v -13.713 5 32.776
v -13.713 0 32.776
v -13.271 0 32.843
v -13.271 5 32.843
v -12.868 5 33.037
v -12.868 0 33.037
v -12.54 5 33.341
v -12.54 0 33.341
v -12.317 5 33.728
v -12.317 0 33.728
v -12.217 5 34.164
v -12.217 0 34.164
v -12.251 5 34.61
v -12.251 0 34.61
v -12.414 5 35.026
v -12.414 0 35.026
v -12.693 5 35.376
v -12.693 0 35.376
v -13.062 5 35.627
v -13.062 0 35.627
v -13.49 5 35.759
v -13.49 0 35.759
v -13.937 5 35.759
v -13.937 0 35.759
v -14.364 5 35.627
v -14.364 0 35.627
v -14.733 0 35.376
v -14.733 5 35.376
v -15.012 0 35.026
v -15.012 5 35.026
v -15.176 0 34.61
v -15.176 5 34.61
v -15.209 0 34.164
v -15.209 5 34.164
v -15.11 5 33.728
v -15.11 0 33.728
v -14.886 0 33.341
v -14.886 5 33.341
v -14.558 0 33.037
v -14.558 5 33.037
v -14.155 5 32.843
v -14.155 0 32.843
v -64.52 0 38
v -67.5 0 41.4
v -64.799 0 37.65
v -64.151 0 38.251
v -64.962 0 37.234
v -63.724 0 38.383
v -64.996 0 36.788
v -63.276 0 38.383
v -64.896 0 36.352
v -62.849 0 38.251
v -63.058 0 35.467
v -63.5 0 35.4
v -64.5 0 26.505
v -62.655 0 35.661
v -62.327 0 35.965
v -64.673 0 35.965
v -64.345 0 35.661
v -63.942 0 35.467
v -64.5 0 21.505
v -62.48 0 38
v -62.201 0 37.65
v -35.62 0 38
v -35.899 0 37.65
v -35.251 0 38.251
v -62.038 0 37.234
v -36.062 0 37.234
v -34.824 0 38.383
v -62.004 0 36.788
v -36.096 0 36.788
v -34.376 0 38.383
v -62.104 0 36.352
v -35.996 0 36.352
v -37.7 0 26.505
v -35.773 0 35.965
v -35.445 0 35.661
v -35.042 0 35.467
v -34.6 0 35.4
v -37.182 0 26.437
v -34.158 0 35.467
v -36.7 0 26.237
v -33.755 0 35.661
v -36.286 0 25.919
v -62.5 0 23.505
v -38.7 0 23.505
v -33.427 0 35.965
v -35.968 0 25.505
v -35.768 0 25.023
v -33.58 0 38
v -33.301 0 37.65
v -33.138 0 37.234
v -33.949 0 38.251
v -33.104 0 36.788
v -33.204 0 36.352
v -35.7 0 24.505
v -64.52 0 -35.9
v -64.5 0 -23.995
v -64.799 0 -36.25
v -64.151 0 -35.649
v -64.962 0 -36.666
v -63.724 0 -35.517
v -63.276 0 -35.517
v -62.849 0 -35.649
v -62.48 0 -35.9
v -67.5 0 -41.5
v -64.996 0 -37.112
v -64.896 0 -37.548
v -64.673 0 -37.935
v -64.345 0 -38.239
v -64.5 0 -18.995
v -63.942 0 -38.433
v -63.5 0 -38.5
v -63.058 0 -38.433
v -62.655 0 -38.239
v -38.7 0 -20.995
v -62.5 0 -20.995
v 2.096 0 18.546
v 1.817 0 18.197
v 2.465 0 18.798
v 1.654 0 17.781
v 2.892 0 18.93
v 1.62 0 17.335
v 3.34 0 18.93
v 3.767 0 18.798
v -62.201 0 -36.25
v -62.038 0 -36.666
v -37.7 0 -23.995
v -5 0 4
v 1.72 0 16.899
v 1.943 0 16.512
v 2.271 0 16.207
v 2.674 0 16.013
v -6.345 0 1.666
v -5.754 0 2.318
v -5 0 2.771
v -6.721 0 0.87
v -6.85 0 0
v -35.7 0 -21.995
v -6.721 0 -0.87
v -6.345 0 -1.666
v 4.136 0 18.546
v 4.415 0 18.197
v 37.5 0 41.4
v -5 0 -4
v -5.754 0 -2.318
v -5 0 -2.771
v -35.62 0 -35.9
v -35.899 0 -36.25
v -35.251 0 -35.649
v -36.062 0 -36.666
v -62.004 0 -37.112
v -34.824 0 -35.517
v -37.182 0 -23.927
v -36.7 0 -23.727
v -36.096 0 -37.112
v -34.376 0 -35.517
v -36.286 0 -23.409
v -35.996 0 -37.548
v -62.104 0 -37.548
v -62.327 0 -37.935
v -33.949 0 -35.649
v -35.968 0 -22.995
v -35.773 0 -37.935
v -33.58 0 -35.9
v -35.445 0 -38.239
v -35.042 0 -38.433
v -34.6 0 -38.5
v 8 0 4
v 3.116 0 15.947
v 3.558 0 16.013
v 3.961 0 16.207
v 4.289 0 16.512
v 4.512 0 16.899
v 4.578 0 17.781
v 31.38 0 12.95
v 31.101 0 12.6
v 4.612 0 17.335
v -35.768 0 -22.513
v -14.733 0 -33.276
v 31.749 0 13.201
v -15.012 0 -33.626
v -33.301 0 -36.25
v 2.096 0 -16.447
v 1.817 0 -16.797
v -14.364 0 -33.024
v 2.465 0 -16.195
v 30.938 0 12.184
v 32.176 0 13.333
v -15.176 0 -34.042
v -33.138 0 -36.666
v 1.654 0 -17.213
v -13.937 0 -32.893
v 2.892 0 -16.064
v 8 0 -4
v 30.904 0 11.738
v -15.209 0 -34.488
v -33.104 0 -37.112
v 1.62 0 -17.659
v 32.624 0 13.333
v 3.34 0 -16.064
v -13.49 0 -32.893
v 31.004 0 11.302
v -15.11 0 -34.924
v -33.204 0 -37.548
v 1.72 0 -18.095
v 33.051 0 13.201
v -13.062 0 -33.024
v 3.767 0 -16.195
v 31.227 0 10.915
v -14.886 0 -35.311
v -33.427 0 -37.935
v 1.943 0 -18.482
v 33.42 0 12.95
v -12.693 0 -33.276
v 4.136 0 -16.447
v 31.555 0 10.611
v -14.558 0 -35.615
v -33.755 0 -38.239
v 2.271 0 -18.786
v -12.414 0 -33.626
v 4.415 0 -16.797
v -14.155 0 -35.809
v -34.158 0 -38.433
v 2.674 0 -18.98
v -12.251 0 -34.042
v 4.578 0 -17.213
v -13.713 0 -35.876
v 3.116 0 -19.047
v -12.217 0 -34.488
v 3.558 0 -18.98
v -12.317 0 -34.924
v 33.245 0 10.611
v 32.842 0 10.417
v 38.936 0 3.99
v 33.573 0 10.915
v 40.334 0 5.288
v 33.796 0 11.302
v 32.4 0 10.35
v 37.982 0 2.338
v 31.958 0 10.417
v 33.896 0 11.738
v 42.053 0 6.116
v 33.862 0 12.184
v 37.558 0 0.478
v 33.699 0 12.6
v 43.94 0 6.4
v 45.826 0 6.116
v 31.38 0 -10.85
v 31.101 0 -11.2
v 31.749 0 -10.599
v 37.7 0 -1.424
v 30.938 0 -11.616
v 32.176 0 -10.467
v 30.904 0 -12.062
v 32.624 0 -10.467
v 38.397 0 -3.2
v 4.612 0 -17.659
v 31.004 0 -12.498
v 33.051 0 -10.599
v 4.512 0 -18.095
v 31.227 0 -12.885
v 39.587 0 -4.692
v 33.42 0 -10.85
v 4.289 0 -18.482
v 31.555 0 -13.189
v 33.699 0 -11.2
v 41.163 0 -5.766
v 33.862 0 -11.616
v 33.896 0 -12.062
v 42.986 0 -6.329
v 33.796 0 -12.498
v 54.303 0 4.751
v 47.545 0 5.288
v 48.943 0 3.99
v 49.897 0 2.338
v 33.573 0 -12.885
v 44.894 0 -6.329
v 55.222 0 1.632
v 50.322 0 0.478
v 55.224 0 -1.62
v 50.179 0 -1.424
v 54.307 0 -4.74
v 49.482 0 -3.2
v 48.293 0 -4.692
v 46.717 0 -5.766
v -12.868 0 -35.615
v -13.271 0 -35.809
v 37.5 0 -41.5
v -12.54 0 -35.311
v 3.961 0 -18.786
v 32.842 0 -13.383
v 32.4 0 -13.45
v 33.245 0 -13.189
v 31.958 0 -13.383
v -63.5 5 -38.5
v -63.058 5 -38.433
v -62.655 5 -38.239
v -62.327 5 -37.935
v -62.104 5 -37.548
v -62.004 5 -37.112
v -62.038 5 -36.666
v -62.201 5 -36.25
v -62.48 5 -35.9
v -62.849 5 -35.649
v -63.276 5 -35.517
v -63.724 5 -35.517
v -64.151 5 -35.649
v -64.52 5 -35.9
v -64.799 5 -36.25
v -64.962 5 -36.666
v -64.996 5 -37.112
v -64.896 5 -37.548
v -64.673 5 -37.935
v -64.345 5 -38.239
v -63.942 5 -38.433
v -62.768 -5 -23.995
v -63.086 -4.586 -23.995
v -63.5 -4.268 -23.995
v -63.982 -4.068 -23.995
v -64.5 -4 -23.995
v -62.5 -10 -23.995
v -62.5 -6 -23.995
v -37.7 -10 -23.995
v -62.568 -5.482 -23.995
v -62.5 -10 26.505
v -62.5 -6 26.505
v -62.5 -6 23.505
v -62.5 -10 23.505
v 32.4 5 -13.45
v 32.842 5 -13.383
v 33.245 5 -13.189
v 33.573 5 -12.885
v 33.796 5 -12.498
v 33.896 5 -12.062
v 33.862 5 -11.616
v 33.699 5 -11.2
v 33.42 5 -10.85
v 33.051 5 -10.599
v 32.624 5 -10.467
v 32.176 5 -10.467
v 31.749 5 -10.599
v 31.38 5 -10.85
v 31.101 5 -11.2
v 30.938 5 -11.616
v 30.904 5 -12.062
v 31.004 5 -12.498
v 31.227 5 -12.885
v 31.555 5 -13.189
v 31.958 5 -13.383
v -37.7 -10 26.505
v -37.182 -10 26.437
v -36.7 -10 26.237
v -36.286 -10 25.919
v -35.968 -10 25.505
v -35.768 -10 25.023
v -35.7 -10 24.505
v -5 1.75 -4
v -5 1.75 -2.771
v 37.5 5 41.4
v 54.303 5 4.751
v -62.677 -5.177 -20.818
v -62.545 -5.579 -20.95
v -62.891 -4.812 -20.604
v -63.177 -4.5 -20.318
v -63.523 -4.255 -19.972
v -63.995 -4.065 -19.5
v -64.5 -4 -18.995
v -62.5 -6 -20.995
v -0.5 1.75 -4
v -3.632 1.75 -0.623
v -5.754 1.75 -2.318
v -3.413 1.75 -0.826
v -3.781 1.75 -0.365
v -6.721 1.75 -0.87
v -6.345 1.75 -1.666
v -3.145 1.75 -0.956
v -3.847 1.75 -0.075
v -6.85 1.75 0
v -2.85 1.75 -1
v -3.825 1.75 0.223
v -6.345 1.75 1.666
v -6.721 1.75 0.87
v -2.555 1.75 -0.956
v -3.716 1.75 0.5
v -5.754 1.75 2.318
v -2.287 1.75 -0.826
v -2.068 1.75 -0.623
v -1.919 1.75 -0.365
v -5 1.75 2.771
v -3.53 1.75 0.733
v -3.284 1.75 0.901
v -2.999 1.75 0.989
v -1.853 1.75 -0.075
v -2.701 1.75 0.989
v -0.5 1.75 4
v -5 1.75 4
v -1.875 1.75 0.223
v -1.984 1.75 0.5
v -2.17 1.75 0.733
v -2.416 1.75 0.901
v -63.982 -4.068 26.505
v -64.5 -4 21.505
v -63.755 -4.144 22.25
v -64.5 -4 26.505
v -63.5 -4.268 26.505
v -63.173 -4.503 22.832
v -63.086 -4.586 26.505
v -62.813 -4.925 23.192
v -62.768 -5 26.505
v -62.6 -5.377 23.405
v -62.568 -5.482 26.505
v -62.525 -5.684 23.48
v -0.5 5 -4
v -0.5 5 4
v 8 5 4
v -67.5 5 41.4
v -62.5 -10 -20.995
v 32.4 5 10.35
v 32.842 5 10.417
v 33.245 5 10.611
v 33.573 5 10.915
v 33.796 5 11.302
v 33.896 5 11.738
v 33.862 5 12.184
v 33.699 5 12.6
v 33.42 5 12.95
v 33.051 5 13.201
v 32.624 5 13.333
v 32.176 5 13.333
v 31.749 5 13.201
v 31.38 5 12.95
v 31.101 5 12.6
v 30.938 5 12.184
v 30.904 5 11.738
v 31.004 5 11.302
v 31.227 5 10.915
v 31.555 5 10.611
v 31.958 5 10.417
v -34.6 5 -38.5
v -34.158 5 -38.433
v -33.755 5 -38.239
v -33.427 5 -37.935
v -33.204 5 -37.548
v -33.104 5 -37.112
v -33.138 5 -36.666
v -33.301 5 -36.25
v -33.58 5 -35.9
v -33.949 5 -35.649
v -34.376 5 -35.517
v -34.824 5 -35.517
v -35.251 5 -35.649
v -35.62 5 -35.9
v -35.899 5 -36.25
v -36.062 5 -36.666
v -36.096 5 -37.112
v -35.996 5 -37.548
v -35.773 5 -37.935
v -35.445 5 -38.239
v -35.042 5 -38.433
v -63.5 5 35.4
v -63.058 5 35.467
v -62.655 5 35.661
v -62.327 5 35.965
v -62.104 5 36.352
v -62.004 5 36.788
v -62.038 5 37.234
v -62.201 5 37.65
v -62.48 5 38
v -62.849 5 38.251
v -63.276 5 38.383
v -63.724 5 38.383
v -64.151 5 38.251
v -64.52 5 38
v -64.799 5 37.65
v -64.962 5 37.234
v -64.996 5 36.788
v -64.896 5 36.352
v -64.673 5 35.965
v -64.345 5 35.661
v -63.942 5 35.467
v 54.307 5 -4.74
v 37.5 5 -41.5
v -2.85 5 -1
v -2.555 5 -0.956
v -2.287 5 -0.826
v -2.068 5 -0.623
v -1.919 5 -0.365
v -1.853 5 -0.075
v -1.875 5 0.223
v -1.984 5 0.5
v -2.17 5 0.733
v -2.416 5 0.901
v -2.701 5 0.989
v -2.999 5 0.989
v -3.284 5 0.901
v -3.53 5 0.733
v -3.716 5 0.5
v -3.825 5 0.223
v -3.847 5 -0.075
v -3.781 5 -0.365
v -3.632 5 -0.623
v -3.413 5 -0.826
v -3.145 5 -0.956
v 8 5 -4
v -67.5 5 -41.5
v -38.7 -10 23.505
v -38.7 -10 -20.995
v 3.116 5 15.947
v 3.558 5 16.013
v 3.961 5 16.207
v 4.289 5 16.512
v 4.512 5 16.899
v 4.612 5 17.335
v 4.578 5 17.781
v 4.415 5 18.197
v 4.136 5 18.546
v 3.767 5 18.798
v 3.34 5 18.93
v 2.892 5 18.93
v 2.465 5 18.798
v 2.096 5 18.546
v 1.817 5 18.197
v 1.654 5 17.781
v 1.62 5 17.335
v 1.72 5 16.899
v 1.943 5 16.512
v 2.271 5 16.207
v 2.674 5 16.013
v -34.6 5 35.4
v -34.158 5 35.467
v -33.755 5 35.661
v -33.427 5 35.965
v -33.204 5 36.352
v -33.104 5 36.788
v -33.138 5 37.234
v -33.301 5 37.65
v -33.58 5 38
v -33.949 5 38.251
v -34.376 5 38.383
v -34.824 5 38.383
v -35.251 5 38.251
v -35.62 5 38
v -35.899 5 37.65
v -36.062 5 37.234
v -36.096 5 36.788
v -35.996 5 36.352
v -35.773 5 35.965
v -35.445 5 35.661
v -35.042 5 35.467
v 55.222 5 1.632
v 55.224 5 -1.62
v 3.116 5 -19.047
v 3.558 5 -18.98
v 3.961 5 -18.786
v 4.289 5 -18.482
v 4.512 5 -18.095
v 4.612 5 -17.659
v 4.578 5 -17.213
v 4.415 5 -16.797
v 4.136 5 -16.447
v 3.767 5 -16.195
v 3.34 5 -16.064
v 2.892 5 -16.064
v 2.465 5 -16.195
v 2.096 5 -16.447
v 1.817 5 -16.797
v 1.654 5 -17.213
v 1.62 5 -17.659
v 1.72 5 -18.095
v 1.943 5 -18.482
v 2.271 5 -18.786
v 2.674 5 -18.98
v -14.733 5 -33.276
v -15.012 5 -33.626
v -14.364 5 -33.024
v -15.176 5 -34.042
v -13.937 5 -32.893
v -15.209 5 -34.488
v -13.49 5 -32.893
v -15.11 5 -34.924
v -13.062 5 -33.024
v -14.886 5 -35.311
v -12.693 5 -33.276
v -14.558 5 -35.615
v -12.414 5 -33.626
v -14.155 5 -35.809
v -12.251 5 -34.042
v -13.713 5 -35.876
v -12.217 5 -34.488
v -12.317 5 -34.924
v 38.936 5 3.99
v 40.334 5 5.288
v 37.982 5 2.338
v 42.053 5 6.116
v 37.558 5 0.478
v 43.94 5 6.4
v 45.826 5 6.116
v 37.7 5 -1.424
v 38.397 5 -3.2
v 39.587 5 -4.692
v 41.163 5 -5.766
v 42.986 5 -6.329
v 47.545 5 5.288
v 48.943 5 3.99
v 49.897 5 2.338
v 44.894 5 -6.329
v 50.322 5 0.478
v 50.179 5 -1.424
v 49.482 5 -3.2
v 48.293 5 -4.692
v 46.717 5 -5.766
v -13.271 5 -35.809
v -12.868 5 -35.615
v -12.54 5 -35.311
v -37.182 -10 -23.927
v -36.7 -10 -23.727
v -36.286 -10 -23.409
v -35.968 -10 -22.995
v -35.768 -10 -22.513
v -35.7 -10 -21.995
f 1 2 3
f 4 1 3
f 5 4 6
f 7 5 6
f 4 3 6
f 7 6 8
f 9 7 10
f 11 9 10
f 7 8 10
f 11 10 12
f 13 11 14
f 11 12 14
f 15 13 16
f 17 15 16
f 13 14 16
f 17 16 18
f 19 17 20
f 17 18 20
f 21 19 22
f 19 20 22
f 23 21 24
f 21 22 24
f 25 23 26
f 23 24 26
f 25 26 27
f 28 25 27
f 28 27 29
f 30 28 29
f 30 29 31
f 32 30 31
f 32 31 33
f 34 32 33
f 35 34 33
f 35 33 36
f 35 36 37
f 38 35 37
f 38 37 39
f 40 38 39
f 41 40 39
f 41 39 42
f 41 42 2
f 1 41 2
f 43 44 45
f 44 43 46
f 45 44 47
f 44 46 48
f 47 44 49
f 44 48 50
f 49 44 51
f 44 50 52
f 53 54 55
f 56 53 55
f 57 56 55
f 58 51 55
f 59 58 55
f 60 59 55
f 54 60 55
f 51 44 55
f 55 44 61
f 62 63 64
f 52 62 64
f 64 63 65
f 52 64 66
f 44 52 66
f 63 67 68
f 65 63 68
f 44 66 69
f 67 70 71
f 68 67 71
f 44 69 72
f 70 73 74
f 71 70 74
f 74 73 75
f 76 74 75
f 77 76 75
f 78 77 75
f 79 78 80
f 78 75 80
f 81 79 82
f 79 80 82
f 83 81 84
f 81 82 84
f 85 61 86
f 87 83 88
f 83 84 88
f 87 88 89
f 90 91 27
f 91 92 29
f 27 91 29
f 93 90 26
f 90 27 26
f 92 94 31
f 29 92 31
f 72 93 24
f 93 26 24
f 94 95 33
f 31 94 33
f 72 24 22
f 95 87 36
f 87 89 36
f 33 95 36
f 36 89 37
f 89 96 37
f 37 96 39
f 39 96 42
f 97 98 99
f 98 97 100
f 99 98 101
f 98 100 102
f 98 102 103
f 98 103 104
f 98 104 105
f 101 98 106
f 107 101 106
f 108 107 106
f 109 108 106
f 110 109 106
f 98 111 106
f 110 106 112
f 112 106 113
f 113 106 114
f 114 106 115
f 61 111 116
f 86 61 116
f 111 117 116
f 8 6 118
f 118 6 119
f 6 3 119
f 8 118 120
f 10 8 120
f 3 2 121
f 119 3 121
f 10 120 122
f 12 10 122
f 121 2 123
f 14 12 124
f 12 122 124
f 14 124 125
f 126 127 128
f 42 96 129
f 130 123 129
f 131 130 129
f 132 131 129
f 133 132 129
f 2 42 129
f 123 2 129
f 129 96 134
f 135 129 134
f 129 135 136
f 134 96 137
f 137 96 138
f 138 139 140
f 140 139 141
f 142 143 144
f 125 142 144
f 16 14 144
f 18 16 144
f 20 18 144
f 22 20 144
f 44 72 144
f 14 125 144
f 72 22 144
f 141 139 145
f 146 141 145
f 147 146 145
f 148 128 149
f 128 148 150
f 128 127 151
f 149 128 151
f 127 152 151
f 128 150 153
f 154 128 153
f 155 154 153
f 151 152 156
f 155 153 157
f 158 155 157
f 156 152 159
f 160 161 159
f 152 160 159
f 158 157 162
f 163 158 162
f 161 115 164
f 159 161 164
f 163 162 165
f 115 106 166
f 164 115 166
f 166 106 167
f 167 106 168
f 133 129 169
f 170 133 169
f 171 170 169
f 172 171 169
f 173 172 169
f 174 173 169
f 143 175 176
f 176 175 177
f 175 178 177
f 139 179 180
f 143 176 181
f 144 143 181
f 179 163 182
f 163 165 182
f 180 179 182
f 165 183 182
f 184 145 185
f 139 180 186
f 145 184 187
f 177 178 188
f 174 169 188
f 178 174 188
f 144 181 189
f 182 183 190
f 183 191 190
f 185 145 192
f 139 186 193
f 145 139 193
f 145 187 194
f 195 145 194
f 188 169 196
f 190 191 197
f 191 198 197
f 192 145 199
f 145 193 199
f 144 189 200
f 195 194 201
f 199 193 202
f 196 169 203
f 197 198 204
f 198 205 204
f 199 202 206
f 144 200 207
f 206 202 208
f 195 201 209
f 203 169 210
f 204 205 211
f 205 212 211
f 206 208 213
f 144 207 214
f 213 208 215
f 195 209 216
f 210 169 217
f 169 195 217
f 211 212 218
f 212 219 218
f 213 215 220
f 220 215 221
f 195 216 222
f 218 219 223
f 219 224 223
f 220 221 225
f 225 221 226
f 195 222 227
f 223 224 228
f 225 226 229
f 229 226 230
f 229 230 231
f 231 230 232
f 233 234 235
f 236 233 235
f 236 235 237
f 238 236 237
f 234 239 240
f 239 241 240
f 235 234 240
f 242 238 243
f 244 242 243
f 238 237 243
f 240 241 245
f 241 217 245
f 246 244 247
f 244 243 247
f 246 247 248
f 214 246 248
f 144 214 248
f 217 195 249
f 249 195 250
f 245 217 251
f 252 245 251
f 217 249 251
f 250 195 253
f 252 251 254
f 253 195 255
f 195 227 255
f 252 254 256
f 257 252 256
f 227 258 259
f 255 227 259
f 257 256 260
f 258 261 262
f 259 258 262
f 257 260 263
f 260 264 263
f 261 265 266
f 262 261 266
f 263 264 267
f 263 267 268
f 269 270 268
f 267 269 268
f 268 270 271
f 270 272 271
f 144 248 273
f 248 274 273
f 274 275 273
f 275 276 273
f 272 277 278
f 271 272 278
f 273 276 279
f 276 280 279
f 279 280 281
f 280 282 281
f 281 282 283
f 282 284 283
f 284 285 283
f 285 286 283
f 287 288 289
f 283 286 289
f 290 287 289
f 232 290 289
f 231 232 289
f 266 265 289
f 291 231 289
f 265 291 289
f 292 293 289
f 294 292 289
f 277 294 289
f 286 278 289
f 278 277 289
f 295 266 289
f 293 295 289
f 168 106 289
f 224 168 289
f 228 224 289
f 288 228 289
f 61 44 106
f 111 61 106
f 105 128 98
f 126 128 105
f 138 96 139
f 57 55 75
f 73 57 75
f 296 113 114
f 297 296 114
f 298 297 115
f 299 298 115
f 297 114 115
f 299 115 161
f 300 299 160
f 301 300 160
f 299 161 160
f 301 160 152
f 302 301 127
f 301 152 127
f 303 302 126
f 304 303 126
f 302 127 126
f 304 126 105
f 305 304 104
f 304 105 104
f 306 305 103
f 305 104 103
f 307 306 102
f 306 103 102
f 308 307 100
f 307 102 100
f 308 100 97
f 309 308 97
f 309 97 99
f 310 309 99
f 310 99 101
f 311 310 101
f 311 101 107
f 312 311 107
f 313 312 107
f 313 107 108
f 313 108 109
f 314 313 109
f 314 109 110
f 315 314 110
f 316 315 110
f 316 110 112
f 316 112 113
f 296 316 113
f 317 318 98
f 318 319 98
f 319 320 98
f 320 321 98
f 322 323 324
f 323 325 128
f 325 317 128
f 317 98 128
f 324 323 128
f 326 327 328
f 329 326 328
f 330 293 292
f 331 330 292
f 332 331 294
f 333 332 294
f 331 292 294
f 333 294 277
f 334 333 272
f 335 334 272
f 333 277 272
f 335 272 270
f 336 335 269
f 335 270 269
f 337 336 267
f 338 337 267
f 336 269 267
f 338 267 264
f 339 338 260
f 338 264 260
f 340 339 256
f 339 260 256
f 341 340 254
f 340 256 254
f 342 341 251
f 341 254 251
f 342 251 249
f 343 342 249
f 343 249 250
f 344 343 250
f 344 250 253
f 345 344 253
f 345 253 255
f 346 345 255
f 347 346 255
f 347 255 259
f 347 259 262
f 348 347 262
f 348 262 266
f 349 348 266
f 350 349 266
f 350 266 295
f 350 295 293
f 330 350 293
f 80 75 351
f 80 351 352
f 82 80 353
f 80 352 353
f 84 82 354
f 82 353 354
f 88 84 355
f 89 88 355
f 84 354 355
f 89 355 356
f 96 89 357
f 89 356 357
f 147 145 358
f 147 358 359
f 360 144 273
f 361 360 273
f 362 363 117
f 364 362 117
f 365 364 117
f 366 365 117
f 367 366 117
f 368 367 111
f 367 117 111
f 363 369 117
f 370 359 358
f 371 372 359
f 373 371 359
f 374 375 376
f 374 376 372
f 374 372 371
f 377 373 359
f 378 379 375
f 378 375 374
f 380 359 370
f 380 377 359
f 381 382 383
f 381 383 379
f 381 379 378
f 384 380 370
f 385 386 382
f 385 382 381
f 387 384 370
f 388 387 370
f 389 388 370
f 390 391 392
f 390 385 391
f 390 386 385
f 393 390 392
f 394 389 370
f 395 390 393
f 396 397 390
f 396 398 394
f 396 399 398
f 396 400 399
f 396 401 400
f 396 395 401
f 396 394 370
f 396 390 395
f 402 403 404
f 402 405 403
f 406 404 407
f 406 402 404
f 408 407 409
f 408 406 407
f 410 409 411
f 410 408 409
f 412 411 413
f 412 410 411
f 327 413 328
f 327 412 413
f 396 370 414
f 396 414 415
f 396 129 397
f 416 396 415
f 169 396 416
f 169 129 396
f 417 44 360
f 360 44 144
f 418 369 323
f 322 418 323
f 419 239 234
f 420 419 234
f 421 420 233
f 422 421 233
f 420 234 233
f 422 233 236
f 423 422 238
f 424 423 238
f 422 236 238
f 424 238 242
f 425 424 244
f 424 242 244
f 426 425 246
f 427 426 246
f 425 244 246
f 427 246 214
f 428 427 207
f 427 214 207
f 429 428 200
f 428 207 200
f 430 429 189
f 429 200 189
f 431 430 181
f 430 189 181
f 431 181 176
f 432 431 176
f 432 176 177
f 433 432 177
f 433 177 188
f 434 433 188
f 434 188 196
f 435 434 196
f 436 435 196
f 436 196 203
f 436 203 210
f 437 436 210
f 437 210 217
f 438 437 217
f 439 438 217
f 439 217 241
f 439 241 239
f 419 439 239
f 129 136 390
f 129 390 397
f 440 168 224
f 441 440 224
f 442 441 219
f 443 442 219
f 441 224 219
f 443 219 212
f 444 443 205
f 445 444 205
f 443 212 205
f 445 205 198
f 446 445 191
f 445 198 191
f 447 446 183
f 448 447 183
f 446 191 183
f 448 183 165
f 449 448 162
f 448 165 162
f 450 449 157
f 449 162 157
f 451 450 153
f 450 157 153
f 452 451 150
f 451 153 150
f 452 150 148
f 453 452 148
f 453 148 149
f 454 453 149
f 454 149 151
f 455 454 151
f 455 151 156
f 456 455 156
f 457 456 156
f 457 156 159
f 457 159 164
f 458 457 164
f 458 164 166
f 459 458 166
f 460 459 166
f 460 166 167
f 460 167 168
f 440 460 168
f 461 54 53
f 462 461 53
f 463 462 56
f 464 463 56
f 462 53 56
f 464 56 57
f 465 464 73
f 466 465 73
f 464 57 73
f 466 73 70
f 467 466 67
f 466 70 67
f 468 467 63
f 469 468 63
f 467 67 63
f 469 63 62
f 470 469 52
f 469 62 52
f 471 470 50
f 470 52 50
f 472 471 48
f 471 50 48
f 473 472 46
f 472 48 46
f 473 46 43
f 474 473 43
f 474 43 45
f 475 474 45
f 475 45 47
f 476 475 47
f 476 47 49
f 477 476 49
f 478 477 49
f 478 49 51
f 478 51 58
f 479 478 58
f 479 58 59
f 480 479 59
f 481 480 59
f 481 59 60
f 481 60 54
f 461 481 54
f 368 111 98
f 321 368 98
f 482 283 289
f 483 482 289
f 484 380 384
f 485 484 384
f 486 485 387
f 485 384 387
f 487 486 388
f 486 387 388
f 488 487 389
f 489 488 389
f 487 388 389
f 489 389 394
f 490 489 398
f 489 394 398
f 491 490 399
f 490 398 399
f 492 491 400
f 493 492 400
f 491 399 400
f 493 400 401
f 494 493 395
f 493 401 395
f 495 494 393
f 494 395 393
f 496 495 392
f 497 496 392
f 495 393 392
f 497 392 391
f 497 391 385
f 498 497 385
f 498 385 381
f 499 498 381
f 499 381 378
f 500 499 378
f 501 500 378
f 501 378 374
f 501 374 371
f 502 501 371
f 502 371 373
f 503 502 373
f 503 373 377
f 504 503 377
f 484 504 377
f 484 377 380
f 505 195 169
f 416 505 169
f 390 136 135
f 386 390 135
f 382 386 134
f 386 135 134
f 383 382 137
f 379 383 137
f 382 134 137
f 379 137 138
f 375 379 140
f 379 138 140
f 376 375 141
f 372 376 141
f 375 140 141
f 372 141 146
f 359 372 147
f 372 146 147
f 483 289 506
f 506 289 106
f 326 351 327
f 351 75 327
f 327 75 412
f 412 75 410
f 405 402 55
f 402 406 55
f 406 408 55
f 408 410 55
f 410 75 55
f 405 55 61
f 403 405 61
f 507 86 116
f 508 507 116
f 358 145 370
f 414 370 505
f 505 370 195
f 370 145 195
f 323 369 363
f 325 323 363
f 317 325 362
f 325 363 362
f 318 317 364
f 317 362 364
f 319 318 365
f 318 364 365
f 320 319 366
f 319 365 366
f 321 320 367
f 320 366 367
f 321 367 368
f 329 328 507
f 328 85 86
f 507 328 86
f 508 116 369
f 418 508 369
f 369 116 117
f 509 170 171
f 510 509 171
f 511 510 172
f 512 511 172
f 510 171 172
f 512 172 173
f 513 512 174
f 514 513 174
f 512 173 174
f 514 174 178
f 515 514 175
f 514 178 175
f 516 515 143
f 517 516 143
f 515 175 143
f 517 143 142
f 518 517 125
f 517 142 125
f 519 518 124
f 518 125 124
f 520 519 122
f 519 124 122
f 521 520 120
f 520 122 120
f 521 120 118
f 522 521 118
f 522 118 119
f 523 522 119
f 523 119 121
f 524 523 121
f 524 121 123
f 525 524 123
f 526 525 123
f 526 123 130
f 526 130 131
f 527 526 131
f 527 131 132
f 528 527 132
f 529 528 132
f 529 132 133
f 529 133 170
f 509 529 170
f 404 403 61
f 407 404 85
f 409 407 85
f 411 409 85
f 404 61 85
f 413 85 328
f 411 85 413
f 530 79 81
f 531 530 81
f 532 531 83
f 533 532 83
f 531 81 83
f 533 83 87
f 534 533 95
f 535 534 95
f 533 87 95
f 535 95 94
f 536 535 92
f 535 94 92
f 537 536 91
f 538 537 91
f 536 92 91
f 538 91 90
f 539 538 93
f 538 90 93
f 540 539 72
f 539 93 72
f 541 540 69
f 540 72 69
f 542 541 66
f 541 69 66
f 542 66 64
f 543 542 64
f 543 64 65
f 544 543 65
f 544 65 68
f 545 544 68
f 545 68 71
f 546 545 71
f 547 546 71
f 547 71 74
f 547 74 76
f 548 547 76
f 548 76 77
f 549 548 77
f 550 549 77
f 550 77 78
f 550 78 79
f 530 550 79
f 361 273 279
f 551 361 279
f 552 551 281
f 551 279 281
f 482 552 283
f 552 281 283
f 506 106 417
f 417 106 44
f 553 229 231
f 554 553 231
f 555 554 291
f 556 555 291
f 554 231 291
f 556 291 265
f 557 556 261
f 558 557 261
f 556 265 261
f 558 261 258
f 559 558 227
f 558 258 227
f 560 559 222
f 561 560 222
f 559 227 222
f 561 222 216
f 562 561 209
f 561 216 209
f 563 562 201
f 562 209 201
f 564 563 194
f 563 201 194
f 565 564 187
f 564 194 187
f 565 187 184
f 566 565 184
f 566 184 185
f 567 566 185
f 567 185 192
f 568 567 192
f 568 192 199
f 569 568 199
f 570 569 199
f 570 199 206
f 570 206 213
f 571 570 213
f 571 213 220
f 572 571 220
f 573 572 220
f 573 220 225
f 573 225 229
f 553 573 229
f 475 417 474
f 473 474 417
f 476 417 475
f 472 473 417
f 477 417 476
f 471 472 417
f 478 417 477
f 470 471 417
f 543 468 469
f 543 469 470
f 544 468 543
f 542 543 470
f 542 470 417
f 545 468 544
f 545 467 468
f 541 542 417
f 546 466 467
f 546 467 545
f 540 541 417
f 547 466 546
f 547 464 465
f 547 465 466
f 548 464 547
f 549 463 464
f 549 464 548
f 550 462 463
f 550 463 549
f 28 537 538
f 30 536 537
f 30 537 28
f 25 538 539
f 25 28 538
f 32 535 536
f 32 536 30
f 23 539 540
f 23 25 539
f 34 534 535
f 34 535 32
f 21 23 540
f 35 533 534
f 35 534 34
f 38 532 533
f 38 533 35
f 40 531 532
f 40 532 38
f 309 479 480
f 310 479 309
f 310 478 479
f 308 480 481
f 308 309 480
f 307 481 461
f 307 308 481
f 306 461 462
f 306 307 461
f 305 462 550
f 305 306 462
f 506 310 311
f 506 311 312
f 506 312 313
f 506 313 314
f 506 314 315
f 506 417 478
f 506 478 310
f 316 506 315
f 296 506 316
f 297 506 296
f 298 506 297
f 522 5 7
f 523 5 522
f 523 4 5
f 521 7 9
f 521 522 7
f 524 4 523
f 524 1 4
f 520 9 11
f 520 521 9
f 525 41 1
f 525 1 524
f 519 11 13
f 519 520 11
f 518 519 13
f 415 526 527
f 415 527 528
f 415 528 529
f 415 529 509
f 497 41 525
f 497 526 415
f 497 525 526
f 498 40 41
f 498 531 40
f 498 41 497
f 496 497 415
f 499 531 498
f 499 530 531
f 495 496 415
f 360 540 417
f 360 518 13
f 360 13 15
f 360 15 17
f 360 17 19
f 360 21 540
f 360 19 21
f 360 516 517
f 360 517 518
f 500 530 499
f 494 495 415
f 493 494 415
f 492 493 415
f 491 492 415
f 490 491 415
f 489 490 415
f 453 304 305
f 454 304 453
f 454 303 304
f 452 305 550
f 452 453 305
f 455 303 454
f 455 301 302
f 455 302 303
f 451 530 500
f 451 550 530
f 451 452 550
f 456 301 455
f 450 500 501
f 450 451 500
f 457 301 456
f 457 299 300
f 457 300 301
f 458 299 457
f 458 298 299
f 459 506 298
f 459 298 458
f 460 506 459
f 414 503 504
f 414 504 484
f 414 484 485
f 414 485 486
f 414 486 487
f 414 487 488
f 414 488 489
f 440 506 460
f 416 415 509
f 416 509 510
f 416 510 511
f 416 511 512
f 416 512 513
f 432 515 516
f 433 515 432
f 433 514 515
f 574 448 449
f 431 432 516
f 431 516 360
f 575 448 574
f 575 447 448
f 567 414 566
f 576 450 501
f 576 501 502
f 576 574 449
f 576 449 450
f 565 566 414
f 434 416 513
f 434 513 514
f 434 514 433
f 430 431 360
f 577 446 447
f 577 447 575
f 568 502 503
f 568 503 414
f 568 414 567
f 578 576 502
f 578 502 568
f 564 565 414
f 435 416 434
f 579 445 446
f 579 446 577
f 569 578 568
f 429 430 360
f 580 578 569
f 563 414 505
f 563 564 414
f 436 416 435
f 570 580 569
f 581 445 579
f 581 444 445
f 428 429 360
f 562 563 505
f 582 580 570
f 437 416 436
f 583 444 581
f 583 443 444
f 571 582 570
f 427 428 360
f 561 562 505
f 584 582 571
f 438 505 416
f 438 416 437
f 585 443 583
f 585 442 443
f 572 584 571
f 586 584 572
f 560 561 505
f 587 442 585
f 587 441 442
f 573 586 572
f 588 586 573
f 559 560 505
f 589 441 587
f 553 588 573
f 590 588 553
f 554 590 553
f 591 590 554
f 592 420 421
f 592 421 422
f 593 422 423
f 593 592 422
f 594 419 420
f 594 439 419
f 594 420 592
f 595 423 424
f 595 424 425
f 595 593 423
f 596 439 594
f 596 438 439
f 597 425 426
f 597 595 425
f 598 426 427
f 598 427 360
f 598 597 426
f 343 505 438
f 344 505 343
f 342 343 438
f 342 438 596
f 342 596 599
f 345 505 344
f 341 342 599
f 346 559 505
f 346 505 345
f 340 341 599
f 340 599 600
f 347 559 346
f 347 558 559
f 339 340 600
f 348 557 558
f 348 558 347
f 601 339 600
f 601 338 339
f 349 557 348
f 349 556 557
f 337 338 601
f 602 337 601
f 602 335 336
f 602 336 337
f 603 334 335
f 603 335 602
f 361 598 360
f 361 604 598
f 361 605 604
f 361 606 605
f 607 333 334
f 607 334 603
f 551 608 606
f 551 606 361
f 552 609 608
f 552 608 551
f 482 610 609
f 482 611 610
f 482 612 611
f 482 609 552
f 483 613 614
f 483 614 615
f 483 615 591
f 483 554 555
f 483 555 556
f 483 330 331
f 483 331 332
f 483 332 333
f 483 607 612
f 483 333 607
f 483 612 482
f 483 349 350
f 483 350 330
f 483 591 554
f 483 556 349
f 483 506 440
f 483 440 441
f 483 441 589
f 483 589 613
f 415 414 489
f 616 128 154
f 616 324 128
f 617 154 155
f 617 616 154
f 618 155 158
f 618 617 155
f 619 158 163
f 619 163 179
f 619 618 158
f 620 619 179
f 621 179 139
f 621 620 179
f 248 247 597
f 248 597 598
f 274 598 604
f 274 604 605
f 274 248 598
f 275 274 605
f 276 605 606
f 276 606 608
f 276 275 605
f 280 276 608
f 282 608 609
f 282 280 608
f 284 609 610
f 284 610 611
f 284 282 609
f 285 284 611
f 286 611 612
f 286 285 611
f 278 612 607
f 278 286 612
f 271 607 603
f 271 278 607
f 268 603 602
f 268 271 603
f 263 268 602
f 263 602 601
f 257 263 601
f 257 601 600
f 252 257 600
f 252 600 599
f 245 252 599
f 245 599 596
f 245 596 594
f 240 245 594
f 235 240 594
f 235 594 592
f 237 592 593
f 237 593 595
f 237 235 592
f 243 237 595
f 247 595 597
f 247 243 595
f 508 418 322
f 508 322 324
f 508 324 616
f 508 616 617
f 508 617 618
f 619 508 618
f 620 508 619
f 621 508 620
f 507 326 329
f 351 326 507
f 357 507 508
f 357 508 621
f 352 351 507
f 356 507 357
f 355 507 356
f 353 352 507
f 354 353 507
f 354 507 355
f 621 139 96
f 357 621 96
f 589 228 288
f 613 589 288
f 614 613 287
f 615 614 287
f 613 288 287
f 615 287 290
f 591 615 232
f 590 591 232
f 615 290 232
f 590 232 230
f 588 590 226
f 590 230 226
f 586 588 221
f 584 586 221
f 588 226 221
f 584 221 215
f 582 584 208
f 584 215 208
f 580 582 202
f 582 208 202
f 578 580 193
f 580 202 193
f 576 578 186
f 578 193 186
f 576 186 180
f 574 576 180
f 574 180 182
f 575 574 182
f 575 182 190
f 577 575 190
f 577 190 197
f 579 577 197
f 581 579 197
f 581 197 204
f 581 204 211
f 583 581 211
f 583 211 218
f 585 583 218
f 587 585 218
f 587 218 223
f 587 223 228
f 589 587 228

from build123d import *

# Parameters (mm, degrees)
SKETCH1_R           = 6.4
BOSS_EXTRUDE1_DEPTH = 5
SKETCH7_R           = 1.5
CUT_EXTRUDE4_DEPTH  = 10
BOSS_EXTRUDE2_DEPTH = 10
BOSS_EXTRUDE3_DEPTH = 4
FILLET1_R           = 2
FILLET2_R           = 2
SKETCH12_R          = 1.5
CUT_EXTRUDE5_DEPTH  = 13
SKETCH13_W          = 8.5
SKETCH13_H          = 8
CUT_EXTRUDE6_DEPTH  = 13
SKETCH13_3_R        = 3
SKETCH13_3_W        = 13
SKETCH13_3_H        = 8
CUT_EXTRUDE7_DEPTH  = 1.75
SKETCH15_R          = 1
CUT_EXTRUDE9_DEPTH  = 10


with BuildPart() as part:
    # Sketch1 → Boss-Extrude1 (new body)
    with BuildSketch(Plane(origin=(0, 0, 0), x_dir=(1, 0, 0), z_dir=(0, 1, 0))):
        with BuildLine():
            ThreePointArc((54.302519507, -4.751051874), (55.339723673, -0.00587799), (54.307413406, 4.740362963))
            Line((54.307413406, 4.740362963), (37.5, 41.5))
            Line((37.5, 41.5), (-67.5, 41.5))
            Line((-67.5, 41.5), (-67.5, -41.4))
            Line((-67.5, -41.4), (37.5, -41.4))
            Line((37.5, -41.4), (54.302519507, -4.751051874))
        make_face()
        with Locations(Location((43.939725188, 0, 0), (0, 0, 270))):
            Circle(SKETCH1_R, mode=Mode.SUBTRACT)
    extrude(amount=BOSS_EXTRUDE1_DEPTH)

    # Sketch7 → Cut-Extrude4 (cut)
    with BuildSketch(Plane.XZ):
        with Locations(Location((-34.6, 36.9, 0), (0, 0, 270))):
            Circle(SKETCH7_R)
        with Locations(Location((-63.5, 36.9, 0), (0, 0, 270))):
            Circle(SKETCH7_R)
        with Locations(Location((-63.5, -37, 0), (0, 0, 270))):
            Circle(SKETCH7_R)
        with Locations(Location((-34.6, -37, 0), (0, 0, 270))):
            Circle(SKETCH7_R)
    extrude(amount=-CUT_EXTRUDE4_DEPTH, mode=Mode.SUBTRACT)

    # Sketch9 → Boss-Extrude2 (add)
    with BuildSketch(Plane.XZ):
        Polygon((-35.7, 26.505), (-62.5, 26.505), (-62.5, 23.505), (-38.7, 23.505), (-38.7, -20.995), (-62.5, -20.995), (-62.5, -23.995), (-35.7, -23.995), align=None)
    extrude(amount=BOSS_EXTRUDE2_DEPTH)

    # Sketch9<3> → Boss-Extrude3 (add)
    with BuildSketch(Plane.XZ):
        Polygon((-62.5, 26.505), (-64.5, 26.505), (-64.5, 21.505), (-62.5, 23.505), align=None)
        Polygon((-64.5, -18.995), (-64.5, -23.995), (-62.5, -23.995), (-62.5, -20.995), align=None)
    extrude(amount=BOSS_EXTRUDE3_DEPTH)

    # Fillet1
    fillet1_edges = [part.edges().sort_by_distance(p)[0] for p in [
        (-62.5, -4, 25.005),
        (-62.5, -4, -22.495),
    ]]
    fillet(fillet1_edges, radius=FILLET1_R - 0.0001)  # a hair under: the kernel refuses the full size

    # Fillet2
    fillet2_edges = [part.edges().sort_by_distance(p)[0] for p in [
        (-35.7, -5, 26.505),
        (-35.7, -5, -23.995),
    ]]
    fillet(fillet2_edges, radius=FILLET2_R)

    # Sketch12 → Cut-Extrude5 (cut)
    with BuildSketch(Plane.XZ):
        with Locations(Location((32.4, 11.85, 0), (0, 0, 270))):
            Circle(SKETCH12_R)
        with Locations(Location((32.4, -11.95, 0), (0, 0, 270))):
            Circle(SKETCH12_R)
        with Locations(Location((3.115937957, -17.546796564, 0), (0, 0, 270))):
            Circle(SKETCH12_R)
        with Locations(Location((-13.713203436, -34.375937957, 0), (0, 0, 270))):
            Circle(SKETCH12_R)
        with Locations(Location((3.115937957, 17.446796564, 0), (0, 0, 270))):
            Circle(SKETCH12_R)
        with Locations(Location((-13.713203436, 34.275937957, 0), (0, 0, 270))):
            Circle(SKETCH12_R)
    extrude(amount=-CUT_EXTRUDE5_DEPTH, mode=Mode.SUBTRACT)

    # Sketch13 → Cut-Extrude6 (cut)
    with BuildSketch(Plane.XZ):
        with Locations((3.75, 0)):
            Rectangle(SKETCH13_W, SKETCH13_H)
    extrude(amount=-CUT_EXTRUDE6_DEPTH, mode=Mode.SUBTRACT)

    # Sketch13<3> → Cut-Extrude7 (cut)
    with BuildSketch(Plane.XZ):
        with Locations((-3.85, 0)):
            Circle(SKETCH13_3_R)
        with Locations((1.5, 0)):
            Rectangle(SKETCH13_3_W, SKETCH13_3_H)
    extrude(amount=-CUT_EXTRUDE7_DEPTH, mode=Mode.SUBTRACT)

    # Sketch15 → Cut-Extrude9 (cut)
    with BuildSketch(Plane.XZ.offset(-1.75)):
        with Locations(Location((-2.85, 0, 0), (0, 0, 270))):
            Circle(SKETCH15_R)
    extrude(amount=-CUT_EXTRUDE9_DEPTH, mode=Mode.SUBTRACT)


solid = part.part
